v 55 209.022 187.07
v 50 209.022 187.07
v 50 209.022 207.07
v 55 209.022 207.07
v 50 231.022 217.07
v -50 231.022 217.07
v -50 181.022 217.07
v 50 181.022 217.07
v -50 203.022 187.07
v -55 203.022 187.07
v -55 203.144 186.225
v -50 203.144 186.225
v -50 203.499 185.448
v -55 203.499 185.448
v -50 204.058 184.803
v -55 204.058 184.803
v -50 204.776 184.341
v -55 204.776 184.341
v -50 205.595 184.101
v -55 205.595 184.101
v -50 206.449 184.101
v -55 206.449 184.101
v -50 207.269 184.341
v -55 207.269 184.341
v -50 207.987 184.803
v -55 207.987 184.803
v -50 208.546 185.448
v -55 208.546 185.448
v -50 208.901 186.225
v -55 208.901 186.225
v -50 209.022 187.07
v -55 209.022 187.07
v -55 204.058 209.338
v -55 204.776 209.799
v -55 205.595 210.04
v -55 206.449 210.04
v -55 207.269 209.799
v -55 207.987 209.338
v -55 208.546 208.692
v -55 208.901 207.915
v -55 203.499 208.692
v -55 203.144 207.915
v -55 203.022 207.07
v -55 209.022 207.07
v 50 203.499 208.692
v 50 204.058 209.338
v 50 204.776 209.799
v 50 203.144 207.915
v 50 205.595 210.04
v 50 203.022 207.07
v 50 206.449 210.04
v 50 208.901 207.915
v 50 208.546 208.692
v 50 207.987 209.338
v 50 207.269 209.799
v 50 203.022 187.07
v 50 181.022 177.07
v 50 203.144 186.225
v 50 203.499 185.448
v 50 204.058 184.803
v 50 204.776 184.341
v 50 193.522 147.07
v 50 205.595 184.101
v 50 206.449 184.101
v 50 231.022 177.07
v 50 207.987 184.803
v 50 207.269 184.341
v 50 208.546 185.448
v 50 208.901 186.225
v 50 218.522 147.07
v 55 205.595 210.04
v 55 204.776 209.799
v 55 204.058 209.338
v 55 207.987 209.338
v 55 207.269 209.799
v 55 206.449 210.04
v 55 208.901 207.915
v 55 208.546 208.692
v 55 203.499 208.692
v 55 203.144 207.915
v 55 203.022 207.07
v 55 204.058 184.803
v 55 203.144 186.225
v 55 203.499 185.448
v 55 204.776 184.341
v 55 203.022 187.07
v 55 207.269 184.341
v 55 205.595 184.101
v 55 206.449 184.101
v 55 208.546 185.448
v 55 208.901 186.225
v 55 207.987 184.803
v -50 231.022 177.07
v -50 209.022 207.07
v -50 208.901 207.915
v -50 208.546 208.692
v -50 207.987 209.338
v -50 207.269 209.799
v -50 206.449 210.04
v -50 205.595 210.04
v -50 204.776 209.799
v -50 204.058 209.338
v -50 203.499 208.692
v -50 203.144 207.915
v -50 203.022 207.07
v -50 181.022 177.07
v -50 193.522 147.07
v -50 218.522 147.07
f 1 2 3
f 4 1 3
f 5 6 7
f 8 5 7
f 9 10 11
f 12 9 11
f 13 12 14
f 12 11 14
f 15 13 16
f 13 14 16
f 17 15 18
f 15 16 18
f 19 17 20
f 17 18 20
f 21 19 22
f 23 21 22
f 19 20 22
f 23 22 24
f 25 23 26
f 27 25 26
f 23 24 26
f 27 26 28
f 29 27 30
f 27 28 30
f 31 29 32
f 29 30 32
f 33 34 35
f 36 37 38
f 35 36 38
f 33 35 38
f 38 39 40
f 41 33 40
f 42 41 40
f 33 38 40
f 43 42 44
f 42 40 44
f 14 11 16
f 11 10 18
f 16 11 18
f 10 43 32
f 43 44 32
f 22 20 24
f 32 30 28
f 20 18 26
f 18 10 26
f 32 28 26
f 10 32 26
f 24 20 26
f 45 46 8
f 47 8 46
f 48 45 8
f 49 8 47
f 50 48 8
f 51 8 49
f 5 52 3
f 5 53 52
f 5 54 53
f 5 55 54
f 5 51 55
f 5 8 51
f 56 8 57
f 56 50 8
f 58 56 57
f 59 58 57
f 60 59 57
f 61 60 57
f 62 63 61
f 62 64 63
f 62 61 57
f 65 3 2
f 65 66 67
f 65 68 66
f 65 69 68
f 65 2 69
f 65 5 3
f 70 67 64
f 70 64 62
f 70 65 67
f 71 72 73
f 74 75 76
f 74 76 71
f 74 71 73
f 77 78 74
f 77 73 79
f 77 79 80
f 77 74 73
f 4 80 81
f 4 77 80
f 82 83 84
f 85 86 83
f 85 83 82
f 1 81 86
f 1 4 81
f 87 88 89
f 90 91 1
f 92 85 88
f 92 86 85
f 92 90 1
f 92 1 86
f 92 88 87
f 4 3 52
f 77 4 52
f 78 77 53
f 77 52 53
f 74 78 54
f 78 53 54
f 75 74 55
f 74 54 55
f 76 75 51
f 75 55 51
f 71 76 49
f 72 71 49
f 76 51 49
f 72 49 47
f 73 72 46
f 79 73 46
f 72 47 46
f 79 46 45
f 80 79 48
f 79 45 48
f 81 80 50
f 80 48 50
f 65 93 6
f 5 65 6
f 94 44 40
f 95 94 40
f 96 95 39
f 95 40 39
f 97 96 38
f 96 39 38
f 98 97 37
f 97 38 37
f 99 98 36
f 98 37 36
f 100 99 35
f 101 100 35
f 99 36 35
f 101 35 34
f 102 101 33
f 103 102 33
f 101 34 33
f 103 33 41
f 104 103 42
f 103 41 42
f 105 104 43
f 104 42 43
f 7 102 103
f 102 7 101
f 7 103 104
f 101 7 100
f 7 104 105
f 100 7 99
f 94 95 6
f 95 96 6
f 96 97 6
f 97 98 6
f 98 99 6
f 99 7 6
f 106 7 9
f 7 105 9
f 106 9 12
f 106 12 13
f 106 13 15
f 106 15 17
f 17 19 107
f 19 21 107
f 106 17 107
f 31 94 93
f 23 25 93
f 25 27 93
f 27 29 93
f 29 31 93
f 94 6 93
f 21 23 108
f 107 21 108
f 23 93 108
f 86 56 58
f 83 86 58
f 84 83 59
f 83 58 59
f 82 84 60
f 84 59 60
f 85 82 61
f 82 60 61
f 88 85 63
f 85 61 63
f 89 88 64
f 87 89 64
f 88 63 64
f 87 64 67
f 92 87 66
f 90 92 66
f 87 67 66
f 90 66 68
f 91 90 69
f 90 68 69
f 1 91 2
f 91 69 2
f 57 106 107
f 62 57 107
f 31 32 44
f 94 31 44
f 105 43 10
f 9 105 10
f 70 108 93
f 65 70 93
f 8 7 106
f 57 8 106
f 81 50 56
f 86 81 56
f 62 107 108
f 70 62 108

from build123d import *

# Parameters (mm, degrees)
BOSS_EXTRUDE1_DEPTH      = 50
BOSS_EXTRUDE1_DEPTH_BACK = 50
BOSS_EXTRUDE2_START      = 50
BOSS_EXTRUDE2_DEPTH      = 5
BOSS_EXTRUDE3_START      = -55
BOSS_EXTRUDE3_DEPTH      = 5


with BuildPart() as part:
    # Sketch2 → Boss-Extrude1 (new, two sides: drawn at the far end of the back side and taken through both)
    with BuildSketch(Plane(origin=(0, 0, 0), x_dir=(0, 0, -1), z_dir=(1, 0, 0)).offset(-BOSS_EXTRUDE1_DEPTH_BACK)):
        Polygon((-147.070290747, 193.522440667), (-147.070290747, 218.522440667), (-177.070290747, 231.022440667), (-217.070290747, 231.022440667), (-217.070290747, 181.022440667), (-177.070290747, 181.022440667), align=None)
    extrude(amount=BOSS_EXTRUDE1_DEPTH + BOSS_EXTRUDE1_DEPTH_BACK)

    # Sketch3 → Boss-Extrude2 (add)
    with BuildSketch(Plane(origin=(0, 0, 0), x_dir=(0, 0, -1), z_dir=(1, 0, 0)).offset(BOSS_EXTRUDE2_START)):
        with BuildLine():
            Line((-207.070290747, 203.022440667), (-187.070290747, 203.022440667))
            ThreePointArc((-187.070290747, 203.022440667), (-184.070290747, 206.022440667), (-187.070290747, 209.022440667))
            Line((-187.070290747, 209.022440667), (-207.070290747, 209.022440667))
            ThreePointArc((-207.070290747, 209.022440667), (-210.070290747, 206.022440667), (-207.070290747, 203.022440667))
        make_face()
    extrude(amount=BOSS_EXTRUDE2_DEPTH)

    # Sketch3<2> → Boss-Extrude3 (add)
    with BuildSketch(Plane(origin=(0, 0, 0), x_dir=(0, 0, -1), z_dir=(1, 0, 0)).offset(BOSS_EXTRUDE3_START)):
        with BuildLine():
            Line((-207.070290747, 203.022440667), (-187.070290747, 203.022440667))
            ThreePointArc((-187.070290747, 203.022440667), (-184.070290747, 206.022440667), (-187.070290747, 209.022440667))
            Line((-187.070290747, 209.022440667), (-207.070290747, 209.022440667))
            ThreePointArc((-207.070290747, 209.022440667), (-210.070290747, 206.022440667), (-207.070290747, 203.022440667))
        make_face()
    extrude(amount=BOSS_EXTRUDE3_DEPTH)


solid = part.part
